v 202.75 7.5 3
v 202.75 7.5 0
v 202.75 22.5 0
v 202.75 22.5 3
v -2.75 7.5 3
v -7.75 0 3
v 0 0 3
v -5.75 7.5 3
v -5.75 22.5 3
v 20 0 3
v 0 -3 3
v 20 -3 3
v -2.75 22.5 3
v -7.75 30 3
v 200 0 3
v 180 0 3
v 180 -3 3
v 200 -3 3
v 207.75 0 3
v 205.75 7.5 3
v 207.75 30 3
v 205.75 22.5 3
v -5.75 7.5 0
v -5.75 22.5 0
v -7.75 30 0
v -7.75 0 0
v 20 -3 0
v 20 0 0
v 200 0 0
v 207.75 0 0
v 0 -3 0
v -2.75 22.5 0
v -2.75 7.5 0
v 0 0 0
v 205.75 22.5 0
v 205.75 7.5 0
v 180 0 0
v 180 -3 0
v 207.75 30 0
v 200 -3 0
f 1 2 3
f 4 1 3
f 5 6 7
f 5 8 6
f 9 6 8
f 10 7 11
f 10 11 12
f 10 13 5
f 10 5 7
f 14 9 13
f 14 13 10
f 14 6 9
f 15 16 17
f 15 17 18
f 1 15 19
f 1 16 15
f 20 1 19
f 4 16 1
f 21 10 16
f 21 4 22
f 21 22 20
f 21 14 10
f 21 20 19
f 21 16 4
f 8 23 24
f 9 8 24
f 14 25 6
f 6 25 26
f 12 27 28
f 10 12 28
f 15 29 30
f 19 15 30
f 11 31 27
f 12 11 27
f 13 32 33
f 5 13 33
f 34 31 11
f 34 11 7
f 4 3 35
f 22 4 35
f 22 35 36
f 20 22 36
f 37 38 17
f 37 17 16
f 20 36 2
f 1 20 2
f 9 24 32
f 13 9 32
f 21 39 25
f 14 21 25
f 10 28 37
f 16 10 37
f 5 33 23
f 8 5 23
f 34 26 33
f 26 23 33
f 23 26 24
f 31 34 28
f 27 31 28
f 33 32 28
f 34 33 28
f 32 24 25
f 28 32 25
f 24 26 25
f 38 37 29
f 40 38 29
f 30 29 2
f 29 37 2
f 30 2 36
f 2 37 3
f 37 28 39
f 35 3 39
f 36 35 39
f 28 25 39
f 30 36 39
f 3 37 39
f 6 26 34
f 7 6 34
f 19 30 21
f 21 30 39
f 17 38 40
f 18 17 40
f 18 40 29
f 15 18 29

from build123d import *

# Parameters (mm, degrees)
SKETCH_1_W      = 20
SKETCH_1_H      = 3
EXTRUDE_1_DEPTH = 3


with BuildPart() as part:
    # 草图1 → 凸台-拉伸1 (new body)
    with BuildSketch(Plane.XY):
        Polygon((-2.75, 0), (0, 0), (20, 0), (180, 0), (200, 0), (202.75, 0), (207.75, 0), (207.75, 30), (202.75, 30), (200, 30), (0, 30), (-2.75, 30), (-7.75, 30), (-7.75, 0), align=None)
        Polygon((-2.75, 22.5), (-2.75, 15), (-2.75, 7.5), (-5.75, 7.5), (-5.75, 22.5), align=None, mode=Mode.SUBTRACT)
        Polygon((202.75, 7.5), (202.75, 15), (202.75, 22.5), (205.75, 22.5), (205.75, 7.5), align=None, mode=Mode.SUBTRACT)
        with Locations((10, -1.5)):
            Rectangle(SKETCH_1_W, SKETCH_1_H)
        with Locations((190, -1.5)):
            Rectangle(SKETCH_1_W, SKETCH_1_H)
    extrude(amount=EXTRUDE_1_DEPTH)


solid = part.part
